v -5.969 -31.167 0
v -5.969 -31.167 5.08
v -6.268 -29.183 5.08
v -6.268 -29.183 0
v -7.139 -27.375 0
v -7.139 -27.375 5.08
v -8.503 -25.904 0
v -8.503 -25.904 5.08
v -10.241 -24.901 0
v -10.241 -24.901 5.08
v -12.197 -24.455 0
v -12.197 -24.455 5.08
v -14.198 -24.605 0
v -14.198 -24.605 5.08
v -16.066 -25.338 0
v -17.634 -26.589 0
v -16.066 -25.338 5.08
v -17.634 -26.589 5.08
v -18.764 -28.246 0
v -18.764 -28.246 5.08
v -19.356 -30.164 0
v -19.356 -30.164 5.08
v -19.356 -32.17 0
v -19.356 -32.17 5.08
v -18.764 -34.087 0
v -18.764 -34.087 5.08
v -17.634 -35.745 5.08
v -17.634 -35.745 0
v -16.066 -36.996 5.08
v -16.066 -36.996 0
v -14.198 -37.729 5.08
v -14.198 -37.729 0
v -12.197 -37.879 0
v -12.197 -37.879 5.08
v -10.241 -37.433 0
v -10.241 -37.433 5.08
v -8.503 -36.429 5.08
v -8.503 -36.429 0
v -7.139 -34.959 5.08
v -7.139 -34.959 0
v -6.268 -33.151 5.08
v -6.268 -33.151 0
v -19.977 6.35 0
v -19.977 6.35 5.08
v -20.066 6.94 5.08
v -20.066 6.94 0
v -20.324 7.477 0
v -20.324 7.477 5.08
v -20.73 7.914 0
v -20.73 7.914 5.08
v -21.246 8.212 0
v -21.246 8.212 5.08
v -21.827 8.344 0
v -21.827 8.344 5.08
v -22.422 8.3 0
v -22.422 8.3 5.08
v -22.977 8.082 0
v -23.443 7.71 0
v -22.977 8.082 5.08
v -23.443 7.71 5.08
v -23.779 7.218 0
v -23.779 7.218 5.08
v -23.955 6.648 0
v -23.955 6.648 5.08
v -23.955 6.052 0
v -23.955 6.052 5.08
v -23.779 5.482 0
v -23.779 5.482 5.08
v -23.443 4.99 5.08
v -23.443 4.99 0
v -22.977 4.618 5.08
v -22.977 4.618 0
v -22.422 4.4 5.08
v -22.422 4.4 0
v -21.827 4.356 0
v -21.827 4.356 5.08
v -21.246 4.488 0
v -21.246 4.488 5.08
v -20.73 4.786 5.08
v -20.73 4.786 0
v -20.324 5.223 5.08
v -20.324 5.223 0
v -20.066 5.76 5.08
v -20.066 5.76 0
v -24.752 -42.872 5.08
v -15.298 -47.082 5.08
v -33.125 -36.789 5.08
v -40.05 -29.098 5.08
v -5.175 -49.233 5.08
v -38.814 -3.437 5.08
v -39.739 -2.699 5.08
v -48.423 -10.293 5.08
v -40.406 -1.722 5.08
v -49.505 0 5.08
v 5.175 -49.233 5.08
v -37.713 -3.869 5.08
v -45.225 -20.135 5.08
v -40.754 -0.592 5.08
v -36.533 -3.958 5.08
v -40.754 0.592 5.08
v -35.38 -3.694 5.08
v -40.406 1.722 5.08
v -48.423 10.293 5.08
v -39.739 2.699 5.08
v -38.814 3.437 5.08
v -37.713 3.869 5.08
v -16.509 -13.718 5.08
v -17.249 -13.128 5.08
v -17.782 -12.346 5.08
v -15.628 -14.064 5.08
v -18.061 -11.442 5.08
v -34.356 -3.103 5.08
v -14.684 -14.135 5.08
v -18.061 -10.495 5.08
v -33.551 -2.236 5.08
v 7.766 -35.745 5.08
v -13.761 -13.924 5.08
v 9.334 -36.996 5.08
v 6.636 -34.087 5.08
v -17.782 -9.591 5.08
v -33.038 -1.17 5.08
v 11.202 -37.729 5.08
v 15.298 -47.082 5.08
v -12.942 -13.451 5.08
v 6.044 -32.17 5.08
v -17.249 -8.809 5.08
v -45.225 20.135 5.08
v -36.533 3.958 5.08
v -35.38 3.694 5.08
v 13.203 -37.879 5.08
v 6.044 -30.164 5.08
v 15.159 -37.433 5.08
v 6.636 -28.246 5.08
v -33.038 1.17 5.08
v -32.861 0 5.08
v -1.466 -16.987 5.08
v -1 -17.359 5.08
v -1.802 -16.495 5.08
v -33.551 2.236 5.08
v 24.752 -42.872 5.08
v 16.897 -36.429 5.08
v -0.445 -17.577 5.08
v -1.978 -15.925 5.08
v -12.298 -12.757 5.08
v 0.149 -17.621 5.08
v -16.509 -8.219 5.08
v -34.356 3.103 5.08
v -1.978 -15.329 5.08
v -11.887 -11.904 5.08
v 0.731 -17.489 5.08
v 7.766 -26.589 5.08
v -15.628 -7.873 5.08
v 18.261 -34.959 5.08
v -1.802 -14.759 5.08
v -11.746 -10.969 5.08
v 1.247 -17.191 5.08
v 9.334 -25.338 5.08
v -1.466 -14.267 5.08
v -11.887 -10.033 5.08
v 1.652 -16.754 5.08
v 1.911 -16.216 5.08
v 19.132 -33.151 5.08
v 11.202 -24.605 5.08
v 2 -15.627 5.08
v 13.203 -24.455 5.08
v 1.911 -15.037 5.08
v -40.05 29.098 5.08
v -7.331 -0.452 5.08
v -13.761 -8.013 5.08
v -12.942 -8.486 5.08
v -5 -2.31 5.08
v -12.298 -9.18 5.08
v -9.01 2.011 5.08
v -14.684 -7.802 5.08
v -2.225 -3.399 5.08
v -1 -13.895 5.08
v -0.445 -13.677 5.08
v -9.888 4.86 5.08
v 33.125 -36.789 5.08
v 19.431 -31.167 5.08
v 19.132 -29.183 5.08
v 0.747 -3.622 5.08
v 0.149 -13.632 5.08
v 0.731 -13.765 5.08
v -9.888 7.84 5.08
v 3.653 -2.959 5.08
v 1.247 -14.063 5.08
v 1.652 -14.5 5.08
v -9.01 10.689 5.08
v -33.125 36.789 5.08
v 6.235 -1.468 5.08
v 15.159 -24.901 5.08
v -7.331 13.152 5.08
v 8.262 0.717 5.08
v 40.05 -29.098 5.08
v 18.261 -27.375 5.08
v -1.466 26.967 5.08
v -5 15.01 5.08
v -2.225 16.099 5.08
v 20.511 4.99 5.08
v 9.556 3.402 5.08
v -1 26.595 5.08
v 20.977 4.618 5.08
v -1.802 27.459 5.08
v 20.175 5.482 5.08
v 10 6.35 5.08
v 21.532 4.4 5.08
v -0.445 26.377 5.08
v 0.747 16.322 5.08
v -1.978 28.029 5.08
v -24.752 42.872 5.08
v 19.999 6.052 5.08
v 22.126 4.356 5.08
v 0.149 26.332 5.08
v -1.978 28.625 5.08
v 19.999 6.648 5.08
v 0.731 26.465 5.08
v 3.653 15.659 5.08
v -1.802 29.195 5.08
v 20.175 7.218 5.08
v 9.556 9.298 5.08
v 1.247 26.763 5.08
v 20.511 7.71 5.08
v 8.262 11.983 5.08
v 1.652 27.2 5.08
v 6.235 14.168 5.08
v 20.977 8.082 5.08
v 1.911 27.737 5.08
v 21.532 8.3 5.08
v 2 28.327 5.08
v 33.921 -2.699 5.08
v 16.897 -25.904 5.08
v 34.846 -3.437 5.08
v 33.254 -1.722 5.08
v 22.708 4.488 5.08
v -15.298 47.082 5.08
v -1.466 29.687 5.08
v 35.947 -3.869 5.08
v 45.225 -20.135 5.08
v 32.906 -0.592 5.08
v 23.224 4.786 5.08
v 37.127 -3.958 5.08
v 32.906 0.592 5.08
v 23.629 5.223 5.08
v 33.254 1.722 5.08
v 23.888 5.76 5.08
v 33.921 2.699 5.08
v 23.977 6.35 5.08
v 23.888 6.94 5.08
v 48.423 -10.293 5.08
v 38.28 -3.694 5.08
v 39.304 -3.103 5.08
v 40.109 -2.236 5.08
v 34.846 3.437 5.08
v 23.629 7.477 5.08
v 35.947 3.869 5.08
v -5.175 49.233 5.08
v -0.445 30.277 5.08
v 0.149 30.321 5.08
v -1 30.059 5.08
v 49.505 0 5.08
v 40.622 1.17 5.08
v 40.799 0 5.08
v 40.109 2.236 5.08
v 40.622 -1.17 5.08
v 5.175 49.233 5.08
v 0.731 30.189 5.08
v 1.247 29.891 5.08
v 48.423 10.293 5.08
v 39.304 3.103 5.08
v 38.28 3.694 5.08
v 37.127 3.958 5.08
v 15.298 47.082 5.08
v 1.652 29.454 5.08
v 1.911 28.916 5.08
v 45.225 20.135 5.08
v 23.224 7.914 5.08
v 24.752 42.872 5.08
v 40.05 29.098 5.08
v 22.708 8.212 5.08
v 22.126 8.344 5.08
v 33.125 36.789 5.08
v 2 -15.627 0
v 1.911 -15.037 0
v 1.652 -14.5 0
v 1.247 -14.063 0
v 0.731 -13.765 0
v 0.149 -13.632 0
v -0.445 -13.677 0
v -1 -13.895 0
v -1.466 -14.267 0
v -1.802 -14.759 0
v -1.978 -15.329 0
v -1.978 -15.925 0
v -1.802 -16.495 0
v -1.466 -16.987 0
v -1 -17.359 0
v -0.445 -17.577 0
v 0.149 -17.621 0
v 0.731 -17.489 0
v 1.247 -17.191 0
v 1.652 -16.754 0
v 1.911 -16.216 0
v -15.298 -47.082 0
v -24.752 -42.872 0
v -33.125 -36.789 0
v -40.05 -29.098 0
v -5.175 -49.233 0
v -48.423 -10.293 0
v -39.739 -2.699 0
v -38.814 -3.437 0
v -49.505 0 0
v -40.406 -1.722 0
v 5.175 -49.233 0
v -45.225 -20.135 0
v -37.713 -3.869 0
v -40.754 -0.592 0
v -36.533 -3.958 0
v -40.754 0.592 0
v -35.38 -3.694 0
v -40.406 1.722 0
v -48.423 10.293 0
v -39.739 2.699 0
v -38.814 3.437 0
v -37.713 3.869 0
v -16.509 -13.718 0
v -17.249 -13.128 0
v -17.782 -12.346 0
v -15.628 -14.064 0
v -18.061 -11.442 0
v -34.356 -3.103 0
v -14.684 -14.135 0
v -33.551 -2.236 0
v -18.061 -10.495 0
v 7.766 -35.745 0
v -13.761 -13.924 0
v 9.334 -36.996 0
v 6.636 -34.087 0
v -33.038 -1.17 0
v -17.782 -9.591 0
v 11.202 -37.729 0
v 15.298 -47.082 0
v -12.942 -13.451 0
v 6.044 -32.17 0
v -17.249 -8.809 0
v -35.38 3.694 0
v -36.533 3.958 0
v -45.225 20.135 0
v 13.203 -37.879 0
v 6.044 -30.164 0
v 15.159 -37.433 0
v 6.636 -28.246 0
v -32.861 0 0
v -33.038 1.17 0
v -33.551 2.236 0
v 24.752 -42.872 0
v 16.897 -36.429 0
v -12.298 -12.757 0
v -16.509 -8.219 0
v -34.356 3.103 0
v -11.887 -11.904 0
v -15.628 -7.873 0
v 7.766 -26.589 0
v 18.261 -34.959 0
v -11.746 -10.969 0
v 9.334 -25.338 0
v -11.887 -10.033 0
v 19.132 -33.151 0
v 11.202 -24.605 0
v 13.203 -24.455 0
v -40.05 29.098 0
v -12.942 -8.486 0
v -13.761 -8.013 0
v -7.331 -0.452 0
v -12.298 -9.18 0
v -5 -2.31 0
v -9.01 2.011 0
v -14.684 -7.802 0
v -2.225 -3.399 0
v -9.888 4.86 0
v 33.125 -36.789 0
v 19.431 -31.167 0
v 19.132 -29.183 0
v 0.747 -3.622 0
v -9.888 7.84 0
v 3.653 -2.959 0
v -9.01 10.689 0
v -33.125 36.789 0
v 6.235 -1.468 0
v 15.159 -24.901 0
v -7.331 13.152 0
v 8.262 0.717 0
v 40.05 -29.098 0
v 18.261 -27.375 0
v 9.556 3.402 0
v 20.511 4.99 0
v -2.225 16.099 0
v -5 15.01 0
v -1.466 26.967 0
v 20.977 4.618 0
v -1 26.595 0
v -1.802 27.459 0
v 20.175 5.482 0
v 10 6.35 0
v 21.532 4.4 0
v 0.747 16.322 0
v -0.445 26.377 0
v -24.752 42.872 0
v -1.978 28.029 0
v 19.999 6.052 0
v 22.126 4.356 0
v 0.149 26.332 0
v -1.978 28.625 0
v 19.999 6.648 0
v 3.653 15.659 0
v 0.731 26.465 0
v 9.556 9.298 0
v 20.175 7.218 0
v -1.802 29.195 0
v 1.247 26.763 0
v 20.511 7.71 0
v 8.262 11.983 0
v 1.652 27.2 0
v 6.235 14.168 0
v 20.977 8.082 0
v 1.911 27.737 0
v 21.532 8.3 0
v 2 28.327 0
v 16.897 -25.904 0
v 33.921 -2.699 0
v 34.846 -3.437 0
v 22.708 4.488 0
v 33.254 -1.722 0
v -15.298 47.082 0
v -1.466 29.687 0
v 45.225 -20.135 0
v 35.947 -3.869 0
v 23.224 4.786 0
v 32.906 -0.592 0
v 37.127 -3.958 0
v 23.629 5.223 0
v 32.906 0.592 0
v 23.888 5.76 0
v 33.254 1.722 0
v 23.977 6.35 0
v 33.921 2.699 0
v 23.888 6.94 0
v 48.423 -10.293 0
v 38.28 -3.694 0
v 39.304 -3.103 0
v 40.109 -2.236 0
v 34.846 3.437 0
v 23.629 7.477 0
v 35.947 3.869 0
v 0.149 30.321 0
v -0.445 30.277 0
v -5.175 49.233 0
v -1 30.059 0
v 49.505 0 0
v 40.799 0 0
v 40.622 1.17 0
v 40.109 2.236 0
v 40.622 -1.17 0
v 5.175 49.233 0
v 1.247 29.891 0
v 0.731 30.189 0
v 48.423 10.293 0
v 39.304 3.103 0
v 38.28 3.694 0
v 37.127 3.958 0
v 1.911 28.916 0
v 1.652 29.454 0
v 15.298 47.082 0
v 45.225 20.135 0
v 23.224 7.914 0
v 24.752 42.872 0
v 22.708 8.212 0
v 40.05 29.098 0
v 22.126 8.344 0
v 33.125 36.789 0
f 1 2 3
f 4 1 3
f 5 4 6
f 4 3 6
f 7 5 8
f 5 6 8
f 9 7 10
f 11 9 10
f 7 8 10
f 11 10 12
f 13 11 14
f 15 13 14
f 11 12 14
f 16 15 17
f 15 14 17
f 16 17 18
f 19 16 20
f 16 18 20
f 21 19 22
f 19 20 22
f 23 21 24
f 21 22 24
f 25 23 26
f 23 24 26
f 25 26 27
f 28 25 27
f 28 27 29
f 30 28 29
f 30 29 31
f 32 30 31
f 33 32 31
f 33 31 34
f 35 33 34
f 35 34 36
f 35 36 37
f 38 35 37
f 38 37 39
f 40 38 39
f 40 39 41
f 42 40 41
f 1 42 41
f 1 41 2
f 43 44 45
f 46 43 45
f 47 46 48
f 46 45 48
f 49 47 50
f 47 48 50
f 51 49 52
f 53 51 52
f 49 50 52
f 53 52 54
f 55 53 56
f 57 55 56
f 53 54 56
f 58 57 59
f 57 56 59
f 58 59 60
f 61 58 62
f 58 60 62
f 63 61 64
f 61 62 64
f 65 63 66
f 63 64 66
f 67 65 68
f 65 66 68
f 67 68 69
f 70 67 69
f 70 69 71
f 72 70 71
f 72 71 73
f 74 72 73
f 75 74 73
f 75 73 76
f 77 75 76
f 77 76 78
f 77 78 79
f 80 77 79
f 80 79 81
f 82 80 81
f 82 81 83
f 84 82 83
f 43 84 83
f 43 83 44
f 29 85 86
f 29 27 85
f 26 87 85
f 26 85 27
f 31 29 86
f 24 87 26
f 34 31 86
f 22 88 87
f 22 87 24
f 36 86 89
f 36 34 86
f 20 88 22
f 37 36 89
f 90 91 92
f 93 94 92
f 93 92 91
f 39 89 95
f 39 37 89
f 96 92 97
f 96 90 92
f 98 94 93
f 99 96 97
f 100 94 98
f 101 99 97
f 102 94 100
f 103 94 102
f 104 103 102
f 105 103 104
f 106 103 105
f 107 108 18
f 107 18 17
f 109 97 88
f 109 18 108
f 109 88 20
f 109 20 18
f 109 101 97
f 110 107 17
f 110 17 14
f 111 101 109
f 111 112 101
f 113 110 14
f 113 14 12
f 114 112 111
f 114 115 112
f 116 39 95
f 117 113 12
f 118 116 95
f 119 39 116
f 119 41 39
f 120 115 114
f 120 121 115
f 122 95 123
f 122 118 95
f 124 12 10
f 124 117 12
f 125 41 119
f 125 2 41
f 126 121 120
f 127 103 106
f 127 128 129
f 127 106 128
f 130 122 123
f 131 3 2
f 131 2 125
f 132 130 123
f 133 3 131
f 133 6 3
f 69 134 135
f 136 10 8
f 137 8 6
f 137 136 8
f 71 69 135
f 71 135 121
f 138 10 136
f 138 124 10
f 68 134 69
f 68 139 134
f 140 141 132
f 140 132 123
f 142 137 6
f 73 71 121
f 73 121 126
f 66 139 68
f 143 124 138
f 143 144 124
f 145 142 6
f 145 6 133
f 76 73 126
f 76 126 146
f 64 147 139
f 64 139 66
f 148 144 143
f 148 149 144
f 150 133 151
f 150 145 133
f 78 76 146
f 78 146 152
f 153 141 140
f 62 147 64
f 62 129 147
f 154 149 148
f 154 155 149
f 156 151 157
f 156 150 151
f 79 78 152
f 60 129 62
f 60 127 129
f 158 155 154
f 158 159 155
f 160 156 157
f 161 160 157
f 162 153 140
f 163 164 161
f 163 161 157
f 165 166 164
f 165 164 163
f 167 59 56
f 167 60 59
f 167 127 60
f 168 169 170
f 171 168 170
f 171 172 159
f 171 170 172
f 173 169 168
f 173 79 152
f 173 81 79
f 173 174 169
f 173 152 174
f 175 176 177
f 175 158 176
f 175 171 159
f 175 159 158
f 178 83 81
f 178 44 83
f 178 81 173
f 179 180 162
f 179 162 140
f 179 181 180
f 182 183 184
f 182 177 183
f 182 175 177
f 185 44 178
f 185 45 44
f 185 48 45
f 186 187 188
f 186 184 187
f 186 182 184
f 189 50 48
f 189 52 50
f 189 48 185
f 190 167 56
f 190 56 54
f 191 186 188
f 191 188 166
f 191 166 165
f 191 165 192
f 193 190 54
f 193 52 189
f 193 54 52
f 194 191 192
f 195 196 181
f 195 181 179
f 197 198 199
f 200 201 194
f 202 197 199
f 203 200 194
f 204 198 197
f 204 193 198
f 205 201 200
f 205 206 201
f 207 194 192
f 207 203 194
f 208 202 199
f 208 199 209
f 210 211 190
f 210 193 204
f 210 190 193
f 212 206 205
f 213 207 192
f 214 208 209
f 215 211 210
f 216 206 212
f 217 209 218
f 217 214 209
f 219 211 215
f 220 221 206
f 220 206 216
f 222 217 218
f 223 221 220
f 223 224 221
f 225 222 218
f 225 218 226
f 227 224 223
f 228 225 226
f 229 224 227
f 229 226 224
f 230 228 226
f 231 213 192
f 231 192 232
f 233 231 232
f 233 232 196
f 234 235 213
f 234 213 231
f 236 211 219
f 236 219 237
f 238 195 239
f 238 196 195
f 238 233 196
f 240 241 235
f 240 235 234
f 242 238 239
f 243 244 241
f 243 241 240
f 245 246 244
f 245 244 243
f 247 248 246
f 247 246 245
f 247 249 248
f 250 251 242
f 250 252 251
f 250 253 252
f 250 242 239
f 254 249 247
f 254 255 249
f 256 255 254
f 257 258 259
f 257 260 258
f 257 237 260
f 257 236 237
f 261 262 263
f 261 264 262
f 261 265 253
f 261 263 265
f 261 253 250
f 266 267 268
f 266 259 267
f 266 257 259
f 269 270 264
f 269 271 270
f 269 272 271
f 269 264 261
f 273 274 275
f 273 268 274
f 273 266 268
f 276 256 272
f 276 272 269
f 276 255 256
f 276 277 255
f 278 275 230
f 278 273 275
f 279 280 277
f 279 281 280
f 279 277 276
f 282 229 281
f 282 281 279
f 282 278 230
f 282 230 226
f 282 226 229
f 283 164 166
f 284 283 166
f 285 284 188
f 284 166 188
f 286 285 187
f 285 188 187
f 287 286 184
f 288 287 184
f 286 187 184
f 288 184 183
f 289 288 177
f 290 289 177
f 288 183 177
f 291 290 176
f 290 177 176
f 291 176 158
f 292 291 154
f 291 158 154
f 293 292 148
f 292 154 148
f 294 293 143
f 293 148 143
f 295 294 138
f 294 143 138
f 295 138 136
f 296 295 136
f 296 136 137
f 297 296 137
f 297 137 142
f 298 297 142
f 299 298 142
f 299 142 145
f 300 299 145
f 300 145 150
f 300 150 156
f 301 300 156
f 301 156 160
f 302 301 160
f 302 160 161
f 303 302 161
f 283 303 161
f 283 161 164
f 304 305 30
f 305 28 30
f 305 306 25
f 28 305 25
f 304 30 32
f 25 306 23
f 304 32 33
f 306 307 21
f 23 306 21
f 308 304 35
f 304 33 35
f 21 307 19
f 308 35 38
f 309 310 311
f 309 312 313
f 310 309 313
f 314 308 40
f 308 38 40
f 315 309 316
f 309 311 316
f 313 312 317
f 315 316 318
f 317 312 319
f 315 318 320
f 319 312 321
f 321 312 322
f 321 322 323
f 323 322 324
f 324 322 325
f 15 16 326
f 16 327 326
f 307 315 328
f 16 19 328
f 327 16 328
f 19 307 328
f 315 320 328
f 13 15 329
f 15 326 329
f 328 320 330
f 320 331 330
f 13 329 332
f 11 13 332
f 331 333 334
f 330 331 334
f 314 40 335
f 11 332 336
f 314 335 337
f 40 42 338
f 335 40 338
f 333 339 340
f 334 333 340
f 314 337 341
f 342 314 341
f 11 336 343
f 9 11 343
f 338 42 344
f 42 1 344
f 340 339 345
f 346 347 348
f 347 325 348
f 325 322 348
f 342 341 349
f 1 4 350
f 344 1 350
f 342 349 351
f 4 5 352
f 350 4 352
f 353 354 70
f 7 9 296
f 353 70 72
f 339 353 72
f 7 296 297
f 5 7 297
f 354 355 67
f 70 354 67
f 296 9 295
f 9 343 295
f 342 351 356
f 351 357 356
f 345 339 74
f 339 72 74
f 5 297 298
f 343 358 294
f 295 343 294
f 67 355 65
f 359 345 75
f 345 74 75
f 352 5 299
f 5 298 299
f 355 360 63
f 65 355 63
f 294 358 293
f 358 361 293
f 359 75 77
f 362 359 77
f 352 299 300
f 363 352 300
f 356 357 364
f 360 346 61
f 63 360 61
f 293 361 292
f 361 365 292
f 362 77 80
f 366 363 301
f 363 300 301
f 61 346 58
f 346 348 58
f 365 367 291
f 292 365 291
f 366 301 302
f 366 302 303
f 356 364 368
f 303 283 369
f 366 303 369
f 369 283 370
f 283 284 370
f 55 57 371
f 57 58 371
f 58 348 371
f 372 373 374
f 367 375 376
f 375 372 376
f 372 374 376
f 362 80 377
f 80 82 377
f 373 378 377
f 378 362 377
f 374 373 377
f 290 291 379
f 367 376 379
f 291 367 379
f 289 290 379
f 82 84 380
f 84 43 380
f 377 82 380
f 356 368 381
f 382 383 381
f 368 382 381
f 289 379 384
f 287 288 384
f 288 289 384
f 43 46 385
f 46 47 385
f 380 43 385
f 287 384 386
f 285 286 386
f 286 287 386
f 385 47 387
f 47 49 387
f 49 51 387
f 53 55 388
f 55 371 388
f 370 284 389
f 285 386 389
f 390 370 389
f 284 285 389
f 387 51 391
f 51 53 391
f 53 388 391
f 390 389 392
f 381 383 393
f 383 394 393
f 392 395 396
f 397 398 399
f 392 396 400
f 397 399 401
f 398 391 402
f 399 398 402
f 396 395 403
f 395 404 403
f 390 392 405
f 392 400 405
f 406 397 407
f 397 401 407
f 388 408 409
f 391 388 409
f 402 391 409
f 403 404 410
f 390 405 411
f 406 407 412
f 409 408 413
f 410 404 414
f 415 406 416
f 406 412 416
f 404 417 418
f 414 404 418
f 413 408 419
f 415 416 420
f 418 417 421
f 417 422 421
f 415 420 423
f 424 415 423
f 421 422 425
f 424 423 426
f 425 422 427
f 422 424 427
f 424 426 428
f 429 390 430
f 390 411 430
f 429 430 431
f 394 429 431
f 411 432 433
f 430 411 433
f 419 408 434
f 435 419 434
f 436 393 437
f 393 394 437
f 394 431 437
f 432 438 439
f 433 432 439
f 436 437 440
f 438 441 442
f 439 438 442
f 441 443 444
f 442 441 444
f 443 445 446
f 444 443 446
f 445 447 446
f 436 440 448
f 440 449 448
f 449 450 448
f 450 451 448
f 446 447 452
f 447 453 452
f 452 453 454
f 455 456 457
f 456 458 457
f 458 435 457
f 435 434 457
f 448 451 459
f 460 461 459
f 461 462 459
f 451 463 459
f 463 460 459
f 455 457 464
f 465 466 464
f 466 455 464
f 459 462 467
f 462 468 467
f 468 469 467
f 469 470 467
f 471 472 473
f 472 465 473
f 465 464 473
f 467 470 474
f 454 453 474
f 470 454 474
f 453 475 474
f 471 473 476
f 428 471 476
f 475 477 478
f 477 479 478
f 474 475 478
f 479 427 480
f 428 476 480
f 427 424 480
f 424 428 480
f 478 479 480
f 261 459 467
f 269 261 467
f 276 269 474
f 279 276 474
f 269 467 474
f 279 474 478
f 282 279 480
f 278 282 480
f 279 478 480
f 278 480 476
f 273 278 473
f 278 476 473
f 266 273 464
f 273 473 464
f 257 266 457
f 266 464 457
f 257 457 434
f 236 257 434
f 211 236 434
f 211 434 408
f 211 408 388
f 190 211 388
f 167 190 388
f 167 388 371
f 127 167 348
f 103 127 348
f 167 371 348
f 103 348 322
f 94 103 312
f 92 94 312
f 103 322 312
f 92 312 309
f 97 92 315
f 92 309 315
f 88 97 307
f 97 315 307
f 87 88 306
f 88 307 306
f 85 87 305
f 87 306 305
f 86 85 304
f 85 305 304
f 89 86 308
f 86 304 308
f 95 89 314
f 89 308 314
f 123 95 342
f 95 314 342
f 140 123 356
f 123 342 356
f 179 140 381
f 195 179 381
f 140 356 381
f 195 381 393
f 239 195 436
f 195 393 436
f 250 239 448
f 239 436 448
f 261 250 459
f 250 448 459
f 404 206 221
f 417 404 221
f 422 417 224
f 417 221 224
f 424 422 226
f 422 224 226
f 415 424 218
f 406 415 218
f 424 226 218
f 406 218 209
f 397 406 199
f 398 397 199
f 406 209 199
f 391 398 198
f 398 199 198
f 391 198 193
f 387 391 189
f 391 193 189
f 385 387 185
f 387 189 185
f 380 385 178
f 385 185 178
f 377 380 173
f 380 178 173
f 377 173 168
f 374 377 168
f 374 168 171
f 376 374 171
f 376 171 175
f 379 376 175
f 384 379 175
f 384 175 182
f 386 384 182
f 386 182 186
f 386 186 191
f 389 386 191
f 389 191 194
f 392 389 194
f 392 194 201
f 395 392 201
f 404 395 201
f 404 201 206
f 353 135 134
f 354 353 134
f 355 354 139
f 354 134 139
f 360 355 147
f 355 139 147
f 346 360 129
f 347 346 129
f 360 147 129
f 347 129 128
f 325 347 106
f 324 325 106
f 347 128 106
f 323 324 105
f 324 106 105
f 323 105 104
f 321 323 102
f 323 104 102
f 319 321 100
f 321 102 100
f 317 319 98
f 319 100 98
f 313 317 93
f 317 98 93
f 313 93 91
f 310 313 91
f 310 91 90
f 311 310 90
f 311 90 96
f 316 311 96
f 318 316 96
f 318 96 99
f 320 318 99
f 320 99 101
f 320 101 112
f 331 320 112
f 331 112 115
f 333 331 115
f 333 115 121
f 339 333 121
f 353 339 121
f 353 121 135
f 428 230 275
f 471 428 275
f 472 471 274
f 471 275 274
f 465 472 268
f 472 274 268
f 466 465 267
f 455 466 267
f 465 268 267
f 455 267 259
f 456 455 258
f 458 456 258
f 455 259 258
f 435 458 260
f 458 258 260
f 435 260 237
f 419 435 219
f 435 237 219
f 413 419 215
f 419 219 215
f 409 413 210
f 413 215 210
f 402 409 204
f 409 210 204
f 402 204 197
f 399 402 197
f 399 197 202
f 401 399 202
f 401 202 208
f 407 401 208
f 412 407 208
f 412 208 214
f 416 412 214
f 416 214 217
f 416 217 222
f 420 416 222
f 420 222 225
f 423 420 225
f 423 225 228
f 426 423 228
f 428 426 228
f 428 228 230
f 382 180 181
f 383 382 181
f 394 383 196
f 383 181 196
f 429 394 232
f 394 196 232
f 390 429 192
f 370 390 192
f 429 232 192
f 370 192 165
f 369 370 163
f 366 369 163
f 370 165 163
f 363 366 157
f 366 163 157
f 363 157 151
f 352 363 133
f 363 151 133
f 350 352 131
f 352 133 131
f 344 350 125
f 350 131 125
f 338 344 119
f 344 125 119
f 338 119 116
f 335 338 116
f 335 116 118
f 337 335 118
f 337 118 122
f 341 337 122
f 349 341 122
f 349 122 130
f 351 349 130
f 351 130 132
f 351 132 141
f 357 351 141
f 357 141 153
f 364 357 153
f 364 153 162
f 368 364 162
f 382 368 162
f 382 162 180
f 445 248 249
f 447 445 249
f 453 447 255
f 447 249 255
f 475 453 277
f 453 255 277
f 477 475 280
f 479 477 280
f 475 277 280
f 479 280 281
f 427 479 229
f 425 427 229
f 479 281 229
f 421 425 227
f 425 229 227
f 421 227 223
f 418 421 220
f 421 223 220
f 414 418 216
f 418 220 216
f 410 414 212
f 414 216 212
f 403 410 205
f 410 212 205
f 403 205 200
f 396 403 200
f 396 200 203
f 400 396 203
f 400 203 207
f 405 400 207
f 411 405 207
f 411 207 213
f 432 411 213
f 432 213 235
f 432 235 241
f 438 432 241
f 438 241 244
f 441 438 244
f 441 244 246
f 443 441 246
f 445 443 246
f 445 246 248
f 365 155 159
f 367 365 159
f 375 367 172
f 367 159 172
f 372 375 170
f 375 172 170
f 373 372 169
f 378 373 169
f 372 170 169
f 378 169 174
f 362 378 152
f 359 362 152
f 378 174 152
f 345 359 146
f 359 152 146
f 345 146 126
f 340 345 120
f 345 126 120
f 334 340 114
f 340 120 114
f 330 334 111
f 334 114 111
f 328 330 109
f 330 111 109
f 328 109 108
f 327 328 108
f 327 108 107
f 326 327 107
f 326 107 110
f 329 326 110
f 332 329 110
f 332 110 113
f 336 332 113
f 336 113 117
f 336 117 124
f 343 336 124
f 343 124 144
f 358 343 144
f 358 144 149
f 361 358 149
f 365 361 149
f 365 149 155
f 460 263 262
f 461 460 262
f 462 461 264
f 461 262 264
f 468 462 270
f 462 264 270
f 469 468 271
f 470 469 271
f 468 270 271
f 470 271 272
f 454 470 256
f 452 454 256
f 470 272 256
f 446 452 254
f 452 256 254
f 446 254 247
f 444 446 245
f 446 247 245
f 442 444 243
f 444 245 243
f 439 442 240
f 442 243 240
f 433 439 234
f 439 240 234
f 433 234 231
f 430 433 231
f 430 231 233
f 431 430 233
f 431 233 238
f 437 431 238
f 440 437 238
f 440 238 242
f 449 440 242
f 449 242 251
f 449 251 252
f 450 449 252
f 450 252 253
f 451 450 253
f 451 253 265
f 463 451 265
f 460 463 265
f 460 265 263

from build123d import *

# Parameters (mm, degrees)
SKETCH1_R           = 49.5046
BOSS_EXTRUDE1_DEPTH = 5.08
SKETCH2_R           = 47.625
BOSS_EXTRUDE2_DEPTH = 3.175
SKETCH3_R           = 6.731
SKETCH3_R_2         = 3.96875
SKETCH3_R_3         = 10
SKETCH3_R_4         = 3.175
SKETCH3_R_5         = 2
CUT_EXTRUDE1_DEPTH  = 9.255
SKETCH7_R           = 56.423127019
CUT_EXTRUDE2_DEPTH  = 3.175


with BuildPart() as part:
    # Sketch1 → Boss-Extrude1 (new body)
    with BuildSketch(Plane.XY):
        Circle(SKETCH1_R)
    extrude(amount=BOSS_EXTRUDE1_DEPTH)

    # Sketch2 → Boss-Extrude2 (add)
    with BuildSketch(Plane.XY.offset(5.08)):
        Circle(SKETCH2_R)
    extrude(amount=BOSS_EXTRUDE2_DEPTH)

    # Sketch3 → Cut-Extrude1 (cut, through all)
    with BuildSketch(Plane.XY.offset(8.255)):
        with Locations((-12.7, -31.166793627)):
            Circle(SKETCH3_R)
        with Locations((12.7, -31.166793627)):
            Circle(SKETCH3_R)
        with Locations((-36.83, 0)):
            Circle(SKETCH3_R_2)
        with Locations((36.83, 0)):
            Circle(SKETCH3_R_2)
        with Locations((0, 6.35)):
            Circle(SKETCH3_R_3)
        with Locations((-14.921345457, -10.968575281)):
            Circle(SKETCH3_R_4)
        with Locations((0, 28.326878759)):
            Circle(SKETCH3_R_5)
        with Locations((21.976878759, 6.35)):
            Circle(SKETCH3_R_5)
        with Locations((0, -15.626878759)):
            Circle(SKETCH3_R_5)
        with Locations((-21.976878759, 6.35)):
            Circle(SKETCH3_R_5)
    extrude(amount=-CUT_EXTRUDE1_DEPTH, mode=Mode.SUBTRACT)

    # Sketch7 → Cut-Extrude2 (cut)
    with BuildSketch(Plane.XY.offset(8.255)):
        Circle(SKETCH7_R)
    extrude(amount=-CUT_EXTRUDE2_DEPTH, mode=Mode.SUBTRACT)


solid = part.part
